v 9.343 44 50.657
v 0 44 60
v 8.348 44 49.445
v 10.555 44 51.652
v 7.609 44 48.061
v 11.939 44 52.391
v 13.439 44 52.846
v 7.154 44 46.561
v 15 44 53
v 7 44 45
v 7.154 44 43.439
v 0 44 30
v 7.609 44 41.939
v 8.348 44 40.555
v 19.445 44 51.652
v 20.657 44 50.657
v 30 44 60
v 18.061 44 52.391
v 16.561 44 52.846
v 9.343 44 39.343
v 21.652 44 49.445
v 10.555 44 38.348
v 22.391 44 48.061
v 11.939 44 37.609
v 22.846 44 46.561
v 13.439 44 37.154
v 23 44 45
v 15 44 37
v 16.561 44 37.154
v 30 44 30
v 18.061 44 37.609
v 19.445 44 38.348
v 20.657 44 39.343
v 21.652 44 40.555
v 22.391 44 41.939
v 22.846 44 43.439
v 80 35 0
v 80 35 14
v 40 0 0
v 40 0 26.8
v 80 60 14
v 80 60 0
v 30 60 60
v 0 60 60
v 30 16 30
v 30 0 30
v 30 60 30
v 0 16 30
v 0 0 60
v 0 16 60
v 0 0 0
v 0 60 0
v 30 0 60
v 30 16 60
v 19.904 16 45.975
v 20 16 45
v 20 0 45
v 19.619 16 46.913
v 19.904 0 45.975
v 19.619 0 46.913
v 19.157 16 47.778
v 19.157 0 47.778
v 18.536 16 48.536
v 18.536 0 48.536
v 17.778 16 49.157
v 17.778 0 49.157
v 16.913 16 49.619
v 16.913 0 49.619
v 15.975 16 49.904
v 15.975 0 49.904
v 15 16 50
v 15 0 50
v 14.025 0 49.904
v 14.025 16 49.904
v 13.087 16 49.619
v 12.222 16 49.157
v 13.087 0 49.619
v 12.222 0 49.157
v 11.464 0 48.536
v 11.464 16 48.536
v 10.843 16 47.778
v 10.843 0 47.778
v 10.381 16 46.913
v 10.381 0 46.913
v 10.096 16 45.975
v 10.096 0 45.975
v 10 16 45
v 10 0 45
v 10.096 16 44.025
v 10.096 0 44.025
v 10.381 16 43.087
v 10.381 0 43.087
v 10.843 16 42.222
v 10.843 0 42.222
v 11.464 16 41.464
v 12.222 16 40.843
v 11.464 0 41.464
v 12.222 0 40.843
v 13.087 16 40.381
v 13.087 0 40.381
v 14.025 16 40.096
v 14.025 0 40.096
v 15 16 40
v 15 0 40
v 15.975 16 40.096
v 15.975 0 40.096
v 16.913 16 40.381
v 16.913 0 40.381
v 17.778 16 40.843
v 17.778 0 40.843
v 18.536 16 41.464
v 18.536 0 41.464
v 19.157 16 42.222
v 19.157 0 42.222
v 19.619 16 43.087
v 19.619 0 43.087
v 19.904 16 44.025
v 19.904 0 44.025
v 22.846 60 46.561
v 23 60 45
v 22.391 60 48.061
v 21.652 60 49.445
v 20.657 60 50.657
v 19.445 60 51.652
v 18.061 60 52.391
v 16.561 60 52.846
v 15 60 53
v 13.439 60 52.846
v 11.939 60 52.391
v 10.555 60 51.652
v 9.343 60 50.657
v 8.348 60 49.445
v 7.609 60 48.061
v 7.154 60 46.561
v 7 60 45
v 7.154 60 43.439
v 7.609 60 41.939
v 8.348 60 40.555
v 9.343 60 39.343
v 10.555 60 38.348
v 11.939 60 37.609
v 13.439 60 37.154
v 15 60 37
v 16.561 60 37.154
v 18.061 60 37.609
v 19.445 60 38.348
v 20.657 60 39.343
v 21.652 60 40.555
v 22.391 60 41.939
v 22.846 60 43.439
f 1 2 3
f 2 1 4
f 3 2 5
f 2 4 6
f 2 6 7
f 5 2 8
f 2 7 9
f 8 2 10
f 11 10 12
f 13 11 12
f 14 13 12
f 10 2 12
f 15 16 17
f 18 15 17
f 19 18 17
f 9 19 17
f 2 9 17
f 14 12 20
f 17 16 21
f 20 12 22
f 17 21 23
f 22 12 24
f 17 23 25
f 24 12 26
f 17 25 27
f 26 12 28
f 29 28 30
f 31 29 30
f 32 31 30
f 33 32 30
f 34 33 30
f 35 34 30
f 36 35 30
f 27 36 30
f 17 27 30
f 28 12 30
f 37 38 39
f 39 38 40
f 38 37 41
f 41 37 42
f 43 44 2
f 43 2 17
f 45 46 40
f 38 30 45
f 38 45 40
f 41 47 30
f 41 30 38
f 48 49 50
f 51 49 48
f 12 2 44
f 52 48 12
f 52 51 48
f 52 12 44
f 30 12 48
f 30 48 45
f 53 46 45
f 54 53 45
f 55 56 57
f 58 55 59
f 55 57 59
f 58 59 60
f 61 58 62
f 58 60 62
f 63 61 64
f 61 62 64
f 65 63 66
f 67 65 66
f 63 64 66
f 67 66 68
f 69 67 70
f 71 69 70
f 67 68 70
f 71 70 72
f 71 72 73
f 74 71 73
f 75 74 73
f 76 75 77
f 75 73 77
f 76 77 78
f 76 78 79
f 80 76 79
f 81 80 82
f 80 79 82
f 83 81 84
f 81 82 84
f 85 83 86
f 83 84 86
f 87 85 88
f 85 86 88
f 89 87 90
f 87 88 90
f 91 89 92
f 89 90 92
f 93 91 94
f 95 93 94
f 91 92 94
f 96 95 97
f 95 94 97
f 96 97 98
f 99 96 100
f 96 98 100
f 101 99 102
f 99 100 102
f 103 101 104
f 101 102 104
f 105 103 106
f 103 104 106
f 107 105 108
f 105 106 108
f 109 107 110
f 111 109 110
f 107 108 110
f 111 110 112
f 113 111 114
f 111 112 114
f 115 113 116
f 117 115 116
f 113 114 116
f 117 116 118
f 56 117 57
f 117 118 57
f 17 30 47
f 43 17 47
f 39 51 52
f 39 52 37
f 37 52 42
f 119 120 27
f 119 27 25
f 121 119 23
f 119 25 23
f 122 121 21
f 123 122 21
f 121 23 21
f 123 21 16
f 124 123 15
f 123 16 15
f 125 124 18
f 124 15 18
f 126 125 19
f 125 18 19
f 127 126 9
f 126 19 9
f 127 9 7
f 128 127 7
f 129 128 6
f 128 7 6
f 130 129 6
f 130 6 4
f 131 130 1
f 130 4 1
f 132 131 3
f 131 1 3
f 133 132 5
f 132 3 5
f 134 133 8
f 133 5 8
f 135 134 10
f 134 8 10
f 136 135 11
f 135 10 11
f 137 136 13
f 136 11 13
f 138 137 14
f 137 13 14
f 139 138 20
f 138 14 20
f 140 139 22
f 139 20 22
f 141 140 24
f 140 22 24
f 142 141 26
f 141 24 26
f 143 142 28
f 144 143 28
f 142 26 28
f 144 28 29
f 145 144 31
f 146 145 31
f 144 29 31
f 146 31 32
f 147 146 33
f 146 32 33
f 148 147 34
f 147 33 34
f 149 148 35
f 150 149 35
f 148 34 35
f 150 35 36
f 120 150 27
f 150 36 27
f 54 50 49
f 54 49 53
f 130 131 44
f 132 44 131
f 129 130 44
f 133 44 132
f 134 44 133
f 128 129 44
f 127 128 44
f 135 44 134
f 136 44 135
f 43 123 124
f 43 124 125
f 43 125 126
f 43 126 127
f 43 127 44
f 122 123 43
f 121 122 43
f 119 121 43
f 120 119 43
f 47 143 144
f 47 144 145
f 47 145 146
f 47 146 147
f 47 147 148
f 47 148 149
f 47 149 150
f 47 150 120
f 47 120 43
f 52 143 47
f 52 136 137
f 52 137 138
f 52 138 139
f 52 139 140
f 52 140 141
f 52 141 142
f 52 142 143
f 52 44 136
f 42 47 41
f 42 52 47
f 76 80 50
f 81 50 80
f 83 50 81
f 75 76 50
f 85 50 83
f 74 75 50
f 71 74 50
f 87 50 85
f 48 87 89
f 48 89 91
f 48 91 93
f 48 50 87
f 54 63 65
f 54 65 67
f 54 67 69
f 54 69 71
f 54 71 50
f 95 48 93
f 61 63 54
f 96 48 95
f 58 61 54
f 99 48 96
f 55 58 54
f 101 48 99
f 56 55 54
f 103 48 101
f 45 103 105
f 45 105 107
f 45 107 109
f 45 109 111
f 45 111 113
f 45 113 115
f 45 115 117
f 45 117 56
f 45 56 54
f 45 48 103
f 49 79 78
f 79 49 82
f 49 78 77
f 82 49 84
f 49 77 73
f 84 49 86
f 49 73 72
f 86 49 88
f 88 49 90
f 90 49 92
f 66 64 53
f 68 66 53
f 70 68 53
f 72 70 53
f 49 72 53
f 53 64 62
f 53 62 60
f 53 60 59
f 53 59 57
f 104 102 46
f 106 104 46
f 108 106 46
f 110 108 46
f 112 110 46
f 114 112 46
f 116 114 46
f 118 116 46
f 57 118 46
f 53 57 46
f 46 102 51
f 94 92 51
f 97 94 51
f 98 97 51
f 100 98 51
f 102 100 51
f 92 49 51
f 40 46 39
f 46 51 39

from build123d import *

# Parameters (mm, degrees)
SKETCH_W        = 80
SKETCH_H        = 60
PAD_DEPTH       = 30
POCKET_DEPTH    = 30
SKETCH003_W     = 30
SKETCH003_H     = 16
PAD001_DEPTH    = 30
POCKET001_DEPTH = 60
SKETCH005_R     = 5
HOLE_DEPTH      = 16
SKETCH006_R     = 8
HOLE001_DEPTH   = 16


with BuildPart() as part:
    # Sketch → Pad (new body)
    with BuildSketch(Plane.XY):
        with Locations((40, 30)):
            Rectangle(SKETCH_W, SKETCH_H)
    extrude(amount=PAD_DEPTH)

    # Sketch001 (on Face6 of Pad) → Pocket (cut)
    with BuildSketch(Plane.XY.offset(30)):
        Polygon((80, 0), (80, 35), (40, 0), align=None)
    extrude(amount=-POCKET_DEPTH, mode=Mode.SUBTRACT)

    # Sketch003 (on Face4 of Pocket) → Pad001 (join)
    with BuildSketch(Plane.XY.offset(30)):
        with Locations((15, 8)):
            Rectangle(SKETCH003_W, SKETCH003_H)
        with Locations((15, 52)):
            Rectangle(SKETCH003_W, SKETCH003_H)
    extrude(amount=PAD001_DEPTH)

    # Sketch004 (on Face7 of Pad001) → Pocket001 (cut)
    with BuildSketch(Plane(origin=(0, 60, 0), x_dir=(-1, 0, 0), z_dir=(0, 1, 0))):
        Polygon((-30, 30), (-80, 14), (-80, 30), align=None)
    extrude(amount=-POCKET001_DEPTH, mode=Mode.SUBTRACT)

    # Sketch005 (on Face5 of Pocket001) → Hole (cut)
    with BuildSketch(Plane.XZ):
        with Locations((15, 45)):
            Circle(SKETCH005_R)
    extrude(amount=-HOLE_DEPTH, mode=Mode.SUBTRACT)

    # Sketch006 (on Face17 of Hole) → Hole001 (cut)
    with BuildSketch(Plane.XZ.offset(-44)):
        with Locations((15, 45)):
            Circle(SKETCH006_R)
    extrude(amount=-HOLE001_DEPTH, mode=Mode.SUBTRACT)


solid = part.part
